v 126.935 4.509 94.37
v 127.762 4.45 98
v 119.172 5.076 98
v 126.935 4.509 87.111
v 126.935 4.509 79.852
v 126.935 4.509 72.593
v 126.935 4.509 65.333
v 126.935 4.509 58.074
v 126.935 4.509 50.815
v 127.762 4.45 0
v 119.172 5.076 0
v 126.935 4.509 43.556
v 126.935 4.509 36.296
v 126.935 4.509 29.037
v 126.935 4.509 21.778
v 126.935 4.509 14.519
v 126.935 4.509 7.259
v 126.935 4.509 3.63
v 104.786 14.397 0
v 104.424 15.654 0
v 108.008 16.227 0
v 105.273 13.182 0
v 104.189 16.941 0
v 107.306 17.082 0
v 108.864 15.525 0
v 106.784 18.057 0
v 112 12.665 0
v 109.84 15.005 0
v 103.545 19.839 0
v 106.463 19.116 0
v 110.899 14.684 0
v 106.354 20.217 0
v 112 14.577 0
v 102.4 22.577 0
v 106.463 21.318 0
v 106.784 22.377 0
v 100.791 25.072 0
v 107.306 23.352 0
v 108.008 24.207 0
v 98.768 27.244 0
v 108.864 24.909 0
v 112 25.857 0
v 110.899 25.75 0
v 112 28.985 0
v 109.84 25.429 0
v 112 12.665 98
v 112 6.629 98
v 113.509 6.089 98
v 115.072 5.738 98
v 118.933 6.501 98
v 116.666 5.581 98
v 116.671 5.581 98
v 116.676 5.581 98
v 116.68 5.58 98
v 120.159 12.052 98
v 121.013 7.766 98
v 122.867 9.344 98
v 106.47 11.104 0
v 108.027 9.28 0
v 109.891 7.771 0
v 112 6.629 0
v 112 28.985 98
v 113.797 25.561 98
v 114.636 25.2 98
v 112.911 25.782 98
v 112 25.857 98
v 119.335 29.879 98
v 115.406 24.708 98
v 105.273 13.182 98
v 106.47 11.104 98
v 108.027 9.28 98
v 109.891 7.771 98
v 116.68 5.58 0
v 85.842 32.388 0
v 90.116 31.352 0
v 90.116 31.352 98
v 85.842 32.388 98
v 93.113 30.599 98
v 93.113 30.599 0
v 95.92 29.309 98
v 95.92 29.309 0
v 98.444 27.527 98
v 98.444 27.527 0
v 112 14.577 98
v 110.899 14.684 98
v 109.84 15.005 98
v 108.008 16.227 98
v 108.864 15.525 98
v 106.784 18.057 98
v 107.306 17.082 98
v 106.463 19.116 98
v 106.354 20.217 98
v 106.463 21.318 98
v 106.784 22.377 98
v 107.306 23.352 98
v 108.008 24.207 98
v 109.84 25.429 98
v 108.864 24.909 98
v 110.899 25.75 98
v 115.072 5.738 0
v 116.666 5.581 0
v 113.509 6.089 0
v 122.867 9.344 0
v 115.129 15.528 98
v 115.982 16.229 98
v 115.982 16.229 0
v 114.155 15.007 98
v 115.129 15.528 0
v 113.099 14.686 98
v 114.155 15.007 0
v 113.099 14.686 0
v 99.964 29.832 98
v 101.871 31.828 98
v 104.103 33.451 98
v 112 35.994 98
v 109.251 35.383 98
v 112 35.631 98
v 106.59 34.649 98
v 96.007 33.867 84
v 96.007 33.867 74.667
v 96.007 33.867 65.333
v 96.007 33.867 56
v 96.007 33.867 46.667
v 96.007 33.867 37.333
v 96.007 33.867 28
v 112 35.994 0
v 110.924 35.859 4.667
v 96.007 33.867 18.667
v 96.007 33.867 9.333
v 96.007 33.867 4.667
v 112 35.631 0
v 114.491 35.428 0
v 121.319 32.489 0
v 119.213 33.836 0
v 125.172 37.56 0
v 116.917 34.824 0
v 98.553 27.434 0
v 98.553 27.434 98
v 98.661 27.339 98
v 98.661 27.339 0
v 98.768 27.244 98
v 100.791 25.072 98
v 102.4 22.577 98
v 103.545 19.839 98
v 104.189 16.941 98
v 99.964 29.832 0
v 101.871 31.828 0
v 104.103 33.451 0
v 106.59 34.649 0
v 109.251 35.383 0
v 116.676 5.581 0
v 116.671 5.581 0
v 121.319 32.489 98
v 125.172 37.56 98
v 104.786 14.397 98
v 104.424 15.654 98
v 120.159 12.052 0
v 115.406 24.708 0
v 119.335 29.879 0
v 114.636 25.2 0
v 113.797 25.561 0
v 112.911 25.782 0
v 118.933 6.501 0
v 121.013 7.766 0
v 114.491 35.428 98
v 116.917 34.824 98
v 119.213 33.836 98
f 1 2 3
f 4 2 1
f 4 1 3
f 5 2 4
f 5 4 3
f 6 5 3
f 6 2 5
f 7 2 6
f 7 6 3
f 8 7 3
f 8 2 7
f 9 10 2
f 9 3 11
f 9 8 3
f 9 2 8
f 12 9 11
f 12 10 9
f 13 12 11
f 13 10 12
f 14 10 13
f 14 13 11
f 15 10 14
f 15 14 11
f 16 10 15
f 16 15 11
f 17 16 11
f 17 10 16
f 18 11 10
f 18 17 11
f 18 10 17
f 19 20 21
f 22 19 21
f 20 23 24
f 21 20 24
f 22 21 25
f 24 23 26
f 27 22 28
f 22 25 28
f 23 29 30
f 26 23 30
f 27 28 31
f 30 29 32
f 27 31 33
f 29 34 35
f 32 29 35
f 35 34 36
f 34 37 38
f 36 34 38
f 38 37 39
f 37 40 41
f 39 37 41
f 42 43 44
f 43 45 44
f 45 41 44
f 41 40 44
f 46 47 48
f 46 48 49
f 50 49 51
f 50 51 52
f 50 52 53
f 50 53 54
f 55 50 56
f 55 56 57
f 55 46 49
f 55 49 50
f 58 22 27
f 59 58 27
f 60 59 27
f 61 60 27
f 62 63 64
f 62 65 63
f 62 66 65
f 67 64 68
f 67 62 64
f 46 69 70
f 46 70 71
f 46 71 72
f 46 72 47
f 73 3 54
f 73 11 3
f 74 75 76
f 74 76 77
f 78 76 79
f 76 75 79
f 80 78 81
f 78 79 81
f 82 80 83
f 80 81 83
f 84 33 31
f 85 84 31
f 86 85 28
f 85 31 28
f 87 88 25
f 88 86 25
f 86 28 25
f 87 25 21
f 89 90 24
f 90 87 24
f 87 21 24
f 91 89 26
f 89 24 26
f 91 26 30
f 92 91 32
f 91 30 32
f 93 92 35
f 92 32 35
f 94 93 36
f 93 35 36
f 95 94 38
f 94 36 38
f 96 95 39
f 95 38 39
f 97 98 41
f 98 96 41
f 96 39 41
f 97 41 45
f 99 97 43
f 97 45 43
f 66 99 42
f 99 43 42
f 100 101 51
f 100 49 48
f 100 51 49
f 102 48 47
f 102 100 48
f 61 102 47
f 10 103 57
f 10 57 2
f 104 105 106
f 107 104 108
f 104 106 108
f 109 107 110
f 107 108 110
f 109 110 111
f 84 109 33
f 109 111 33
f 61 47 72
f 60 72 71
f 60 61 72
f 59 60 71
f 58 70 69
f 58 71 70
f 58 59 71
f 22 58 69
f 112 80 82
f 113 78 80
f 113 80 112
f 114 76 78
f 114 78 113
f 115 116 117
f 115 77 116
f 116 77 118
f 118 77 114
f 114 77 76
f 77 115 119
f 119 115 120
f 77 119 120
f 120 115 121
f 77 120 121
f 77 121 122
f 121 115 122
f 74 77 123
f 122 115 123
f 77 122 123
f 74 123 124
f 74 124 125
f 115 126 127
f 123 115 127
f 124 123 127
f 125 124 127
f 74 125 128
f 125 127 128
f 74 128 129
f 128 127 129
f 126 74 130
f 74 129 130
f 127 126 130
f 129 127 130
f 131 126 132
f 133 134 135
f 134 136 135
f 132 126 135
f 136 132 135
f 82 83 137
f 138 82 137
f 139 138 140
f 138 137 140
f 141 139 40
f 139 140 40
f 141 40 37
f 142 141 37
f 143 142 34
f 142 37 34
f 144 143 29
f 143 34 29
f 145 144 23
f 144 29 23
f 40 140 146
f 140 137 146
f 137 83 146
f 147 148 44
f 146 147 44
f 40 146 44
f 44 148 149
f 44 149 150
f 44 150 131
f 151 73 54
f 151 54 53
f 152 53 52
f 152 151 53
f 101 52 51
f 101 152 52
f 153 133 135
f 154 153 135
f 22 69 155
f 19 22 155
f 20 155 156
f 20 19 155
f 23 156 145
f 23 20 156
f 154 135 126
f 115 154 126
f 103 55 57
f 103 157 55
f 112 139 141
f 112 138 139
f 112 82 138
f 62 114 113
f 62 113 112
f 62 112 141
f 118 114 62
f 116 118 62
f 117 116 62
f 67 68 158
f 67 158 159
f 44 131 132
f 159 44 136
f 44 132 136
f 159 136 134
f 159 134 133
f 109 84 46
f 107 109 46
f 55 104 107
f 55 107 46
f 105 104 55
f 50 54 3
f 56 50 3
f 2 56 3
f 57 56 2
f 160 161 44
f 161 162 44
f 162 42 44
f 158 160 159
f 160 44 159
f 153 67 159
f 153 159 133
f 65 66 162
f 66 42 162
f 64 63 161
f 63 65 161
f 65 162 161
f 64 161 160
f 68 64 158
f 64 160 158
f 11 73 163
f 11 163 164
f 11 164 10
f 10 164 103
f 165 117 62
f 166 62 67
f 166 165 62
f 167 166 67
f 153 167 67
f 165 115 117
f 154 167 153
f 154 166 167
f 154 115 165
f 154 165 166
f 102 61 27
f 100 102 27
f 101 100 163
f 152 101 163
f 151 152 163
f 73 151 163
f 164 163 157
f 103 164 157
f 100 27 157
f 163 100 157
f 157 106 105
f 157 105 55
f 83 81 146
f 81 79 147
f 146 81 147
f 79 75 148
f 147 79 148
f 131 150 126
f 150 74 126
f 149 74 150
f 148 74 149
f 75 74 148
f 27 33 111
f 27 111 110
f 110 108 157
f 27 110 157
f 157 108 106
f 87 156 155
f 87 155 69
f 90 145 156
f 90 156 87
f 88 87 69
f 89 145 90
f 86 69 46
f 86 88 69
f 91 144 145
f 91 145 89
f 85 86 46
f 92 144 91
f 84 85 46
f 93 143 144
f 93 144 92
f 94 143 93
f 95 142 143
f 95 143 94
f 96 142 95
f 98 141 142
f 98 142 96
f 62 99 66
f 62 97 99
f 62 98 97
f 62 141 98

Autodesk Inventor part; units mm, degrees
ref_plane "YZ Plane" through (0, 0, 0) normal (1, 0, 0) x (0, 1, 0)
ref_plane "XZ Plane" through (0, 0, 0) normal (0, 1, 0) x (-1, 0, 0)
ref_plane "XY Plane" through (0, 0, 0) normal (0, 0, 1) x (1, 0, 0)
sketch "Sketch1" plane through (0, 0, 0) normal (0, 0, 1) x (1, 0, 0)
  spline S0 degree 4 poles (254.4361, 38.2581) (252.1599, 38.6503) (246.7887, 39.4993) (237.9849, 40.6183) (225.3575, 41.7043) (211.2027, 42.3417) (196.3926, 42.4701) (181.0313, 42.0702) (165.5064, 41.2217) (149.7852, 40.0448) (134.1096, 38.5775) (118.6247, 36.8508) (103.5, 34.9393) (88.9016, 32.8834) (74.9958, 30.7382) (61.9178, 28.5627) (49.8271, 26.4098) (38.8354, 24.34) (29.0772, 22.4039) (20.6323, 20.6564) (13.6456, 19.1491) (6.9132, 17.6607) (2.9022, 16.74) (0.4691, 16.1882) (0, 16.065) knots 0.214297 0.214297 0.214297 0.214297 0.214297 0.24332 0.281775 0.321542 0.36238 0.404005 0.446178 0.488665 0.531231 0.573688 0.615803 0.657336 0.698047 0.737682 0.775986 0.812688 0.847495 0.880087 0.910093 0.937059 0.960363 1 1 1 1 1
  spline S1 degree 4 poles (300, 15.624) (299.8057, 13.313) (297.7085, 10.3432) (293.0509, 7.5008) (285.3959, 4.883) (278.1124, 3.2165) (269.5147, 1.8925) (259.681, 0.913) (248.7129, 0.2783) (236.7119, -0.0309) (223.8067, -0.0504) (210.1253, 0.1933) (195.7754, 0.645) (180.9677, 1.2494) (165.6517, 1.9825) (150.1916, 2.9048) (134.6873, 3.9451) (119.3375, 5.0495) (104.3042, 6.1987) (89.7566, 7.3561) (75.8492, 8.4887) (62.7429, 9.5824) (50.5811, 10.6226) (39.4971, 11.5797) (29.6294, 12.4513) (21.0712, 13.2264) (13.9639, 13.8721) (7.1036, 14.5126) (2.9683, 14.8997) (0.533, 15.1397) (-0.0042, 15.1841) knots 0 0 0 0 0 0.054372 0.079821 0.107912 0.138499 0.171341 0.206187 0.242784 0.280891 0.320277 0.360713 0.402023 0.443985 0.486373 0.528958 0.57146 0.613642 0.655265 0.696085 0.735853 0.774308 0.811174 0.846157 0.87893 0.909115 0.936252 0.959711 1 1 1 1 1
  arc A0 (0, 16.065) -> (-0.0042, 15.1841) centre (0.1158, 15.624) ccw
  line L0 (0.1158, 15.624) -> (227.9902, 15.624) construction
  line L1 (300, 15.624) -> (0.1158, 15.624) construction
  line L2 (300, 15.624) -> (200, 15.624) construction
  line L3 (200, 15.624) -> (200, 42.3773) construction
  line L4 (200, 15.624) -> (200, 0.5273)
  line L5 (0, 0) -> (0, 20.241)
  line L6 (0, 20.241) -> (238.581, 20.241) construction
  circle A1 centre (238.581, 20.241) radius 14
  line L7 (238.581, 20.241) -> (208.581, 20.241)
  line L8 (238.581, 25.359) -> (238.581, 20.241)
  line L9 (0, 20.241) -> (112, 20.241) construction
  circle A2 centre (112, 20.241) radius 5.39
  line L10 (0, 15.624) -> (112, 15.624) construction
  line L11 (0, 15.624) -> (112, 15.624) construction
  line L12 (112, 15.624) -> (112, 35.9945)
  line L13 (112, 15.624) -> (112, 5.6153)
  spline S2 degree 4 poles (299.2852, 20.241) (299.2279, 20.1316) (299.168, 20.0232) (299.1056, 19.9158) (299.0406, 19.8092) knots 0.014818 0.014818 0.014818 0.014818 0.014818 0.017711 0.017711 0.017711 0.017711 0.017711
  line L14 (299.2071, 20.0822) -> (298.8742, 19.5363) construction
  arc A3 (298.904, 19.5932) -> (299.1702, 20.0296) centre (292.2911, 23.9254) ccw construction
  line L15 (299.432, 20.5214) -> (299.1384, 19.9606) construction
  arc A4 (299.1639, 20.0188) -> (299.3987, 20.4672) centre (292.801, 23.6361) ccw construction
  spline S3 degree 2 poles (295.8506, 16.56) (295.1573, 16.0692) (294.3933, 15.624) knots 0 0 0 1 1 1
  line L16 (294.5507, 15.7157) -> (294.2359, 15.5323) construction
  arc A5 (294.2672, 15.5511) -> (294.519, 15.6978) centre (283.8844, 33.657) ccw construction
  spline S4 degree 4 poles (296.8569, 15.624) (296.6183, 15.8629) (296.3707, 16.0985) (296.1147, 16.3309) (295.8506, 16.56) knots 0.044099 0.044099 0.044099 0.044099 0.044099 0.050856 0.050856 0.050856 0.050856 0.050856
  spline S5 degree 4 poles (219.5872, 34.9119) (218.6954, 34.952) (214.8585, 35.1063) (210.7072, 35.3295) (192.898, 35.4464) (181.4278, 35.0555) (165.1774, 34.1819) (149.5619, 33.1267) (133.8284, 31.3479) (128.2654, 31.0974) (123.3908, 30.59) knots 0 0 0 0 0 0.139244 0.23322 0.363937 0.509983 0.657115 0.798105 1 1 1 1 1
  line L17 (295.9593, 16.4657) -> (295.7419, 16.6543) construction
  arc A6 (295.9374, 16.4843) -> (295.7635, 16.6352) centre (281.8729, 0.4516) ccw construction
  line L18 (232.7438, 34.3645) -> (201.1936, 35.6815) construction
  arc A7 (229.5868, 34.4549) -> (204.3471, 35.5085) centre (136.3483, -1896.3245) ccw construction
  arc A8 (264.2661, 15.123) -> (264.3608, 15.624) centre (238.581, 20.241) ccw
  circle A9 centre (238.581, 20.241) radius 24
  circle A10 centre (112, 20.241) radius 15.39
  spline S6 degree 4 poles (300, 15.624) (300.2691, 17.9337) (298.7834, 21.2677) (294.6934, 24.9798) (287.5317, 28.9406) (280.4869, 31.8205) (271.481, 34.7182) (262.4868, 36.793) (257.7004, 37.6957) (254.4361, 38.2581) knots 0 0 0 0 0 0.247555 0.363857 0.49255 0.632996 0.778264 1 1 1 1 1
  line L19 (285.2945, 32.941) -> (223.5776, 43.5753) construction
  arc A11 (278.7224, 32.6349) -> (229.6682, 41.0872) centre (217.2184, -177.7386) ccw construction
  line L20 (285.2945, 32.941) -> (223.5776, 43.5753) construction
  arc A12 (278.8771, 33.0418) -> (229.6586, 41.5224) centre (200.8949, -272.4733) ccw construction
  spline S7 degree 4 poles (251.493, 31.7362) (243.7009, 32.9676) (232.1602, 34.2966) (216.4428, 35.2879) (196.3923, 35.4611) (181.0317, 35.0615) (165.5053, 34.2127) (149.7883, 33.0365) (134.1012, 31.5672) (118.6474, 29.8462) (103.4397, 27.9193) (89.0589, 25.9037) (74.8371, 23.6927) (62.4884, 21.6695) (49.6399, 19.3545) (46.3795, 18.7429) (43.8125, 18.259) knots 0 0 0 0 0 0.163963 0.232338 0.302031 0.372642 0.443778 0.515047 0.586134 0.656647 0.726187 0.794348 0.86071 0.920346 1 1 1 1 1
  spline S8 degree 4 poles (295.845, 16.556) (295.7198, 16.6646) (294.585, 17.6283) (292.0585, 19.4283) (287.5167, 21.9347) (280.467, 24.8321) (271.9714, 27.5226) (264.2087, 29.4004) (258.4092, 30.5515) (255.0536, 31.1429) (254.4361, 31.2493) (253.9689, 31.3298) (253.5018, 31.4103) (253.0347, 31.4908) (252.5676, 31.5712) knots 0.050892 0.050892 0.050892 0.050892 0.050892 0.054094 0.079507 0.107628 0.138317 0.171335 0.206423 0.214297 0.214297 0.214297 0.214297 0.220253 0.220253 0.220253 0.220253 0.220253
  line L21 (285.2945, 25.9322) -> (223.5776, 36.5664) construction
  line L22 (285.2945, 25.9322) -> (223.5776, 36.5664) construction
  arc A13 (278.7224, 25.626) -> (229.6682, 34.0784) centre (217.2184, -184.7474) ccw construction
  line L23 (270.129, 9.1254) -> (275.129, 9.1254) construction
  line L24 (281.07, 24.4582) -> (286.07, 24.4582) construction
  line L25 (318.8214, -3.3673) -> (272.8686, 36.4793) construction
  arc A14 (303.2079, 0.552) -> (278.9595, 21.5782) centre (281.8576, 0.4252) ccw construction
  spline S9 degree 4 poles (295.8353, 16.5644) (293.4171, 14.8846) (288.4135, 12.6926) (280.7063, 10.6698) (269.511, 8.9398) (259.6826, 7.9632) (248.7122, 7.3273) (236.7121, 7.0186) (223.8065, 6.9989) (210.1254, 7.2427) (195.7753, 7.6944) (180.968, 8.2987) (165.6509, 9.032) (150.1939, 9.954) (134.681, 10.995) (119.3545, 12.0974) (104.259, 13.2519) (89.8748, 14.3954) (75.7524, 15.5471) (62.9065, 16.6165) (50.5107, 17.6776) (46.5166, 18.0246) (43.8125, 18.259) knots 0 0 0 0 0 0.084767 0.124025 0.166179 0.210904 0.257877 0.306788 0.35734 0.409241 0.462263 0.516122 0.570528 0.625186 0.679738 0.73388 0.787304 0.839697 0.89074 0.937143 1 1 1 1 1
  spline S10 degree 4 poles (21.4623, 20.241) (20.6227, 20.317) (20.124, 20.3622) (19.9191, 20.3809) (19.554, 20.414) knots 0.979732 0.979732 0.979732 0.979732 0.979732 1 1 1 1 1 construction
  line L26 (68.4884, 16.1198) -> (19.1367, 20.3983) construction
  arc A15 (63.5515, 16.5281) -> (24.0702, 19.9509) centre (-819.8994, -9944.3712) ccw construction
  line L27 (21.7244, 20.2173) -> (21.2001, 20.2647) construction
  arc A16 (21.2525, 20.26) -> (21.672, 20.222) centre (898.6358, 9712.9556) ccw construction
  line L28 (74.2541, 23.9969) -> (13.371, 12.5211) construction
  arc A17 (68.1759, 22.7939) -> (19.47, 13.6134) centre (1053.3901, -5337.891) ccw construction
  spline S11 degree 4 poles (218.4375, 7.1934) (217.6173, 7.2408) (213.8192, 7.4688) (209.5863, 6.8507) (192.5485, 7.9441) (181.1469, 8.163) (165.7461, 9.0283) (149.1424, 9.8801) (139.9777, 10.7519) (129.1073, 11.2464) (124.6867, 11.5289) knots 0 0 0 0 0 0.127631 0.213723 0.333628 0.467446 0.602621 0.738424 0.880395 0.880395 0.880395 0.880395 0.880395
  line L29 (133.5337, 10.9635) -> (115.8396, 12.0942) construction
  arc A18 (117.618, 12.0789) -> (131.7678, 11.1747) centre (141.027, 267.2384) ccw construction
  line L30 (140.665, 32.3881) -> (106.1166, 28.792) construction
  arc A19 (137.222, 31.4497) -> (109.679, 28.5828) centre (140.6225, -134.9596) ccw construction
  circle A20 centre (238.581, 20.241) radius 18
  line L31 (238.581, 38.241) -> (225.78, 41.559)
  line L32 (238.581, 2.241) -> (224.22, 0)
  line L33 (214.581, 20.241) -> (214.581, 42.1266) construction
  line L34 (127.39, 20.241) -> (127.39, 11.5255) construction
  line L35 (127.39, 20.241) -> (131.3139, 20.241) construction
  line L36 (96.61, 20.241) -> (96.61, 13.8631) construction
  line L37 (270.129, 5.6153) -> (270.129, 15.624) construction
  line L38 (272.129, 7.6153) -> (272.129, 13.624)
  line L39 (268.129, 13.624) -> (268.129, 7.6153)
  arc A21 (268.129, 7.6153) -> (272.129, 7.6153) centre (270.129, 7.6153) ccw
  arc A22 (272.129, 13.624) -> (268.129, 13.624) centre (270.129, 13.624) ccw
  line L40 (270.129, 32.1807) -> (270.129, 22.172) construction
  line L41 (272.129, 30.1807) -> (272.129, 24.172)
  line L42 (268.129, 24.172) -> (268.129, 30.1807)
  arc A23 (272.129, 30.1807) -> (268.129, 30.1807) centre (270.129, 30.1807) ccw
  arc A24 (268.129, 24.172) -> (272.129, 24.172) centre (270.129, 24.172) ccw
  arc A25 (200, 42.3155) -> (199.8539, 42.3773) centre (190.581, 20.241) ccw
  arc A26 (171.273, 34.4958) -> (171.2681, 34.4892) centre (190.581, 20.241) ccw
  arc A27 (210.7484, 7.2304) -> (209.2875, 35.2765) centre (190.581, 20.241) ccw
  arc A28 (169.4455, 8.8703) -> (169.4744, 8.8168) centre (190.581, 20.241) ccw
  arc A29 (153.9768, 9.6824) -> (154.0303, 9.7394) centre (142.78, 20.241) ccw
  arc A30 (151.2419, 33.0959) -> (151.2193, 33.1107) centre (142.78, 20.241) ccw
  arc A31 (132.1299, 31.3508) -> (130.3229, 11.2037) centre (142.78, 20.241) ccw
  arc A32 (95.2741, 13.9693) -> (95.1698, 26.7415) centre (81.22, 20.241) ccw
  arc A33 (66.334, 16.3348) -> (66.5389, 15.624) centre (81.22, 20.241) ccw
  line L43 (112, 20.241) -> (112, 14.851) construction
  line L44 (112, 14.851) -> (91.265, 14.851) construction
  circle A34 centre (91.265, 14.851) radius 4
  circle A35 centre (111.9941, 20.217) radius 5.39
  arc A36 (104.1892, 16.9411) -> (90.1164, 31.3517) centre (87.5379, 14.7568) ccw
  arc A37 (104.1892, 16.9411) -> (116.9519, 5.574) centre (117.1466, 18.6408) ccw
  line L45 (90.1164, 31.3517) -> (85.8424, 32.3881)
  line L46 (119.172, 5.076) -> (116.6664, 5.5813)
  circle A38 centre (238.581, 20.241) radius 13.69
  circle A39 centre (111.9941, 20.217) radius 5.64
  line L47 (111.9941, 20.217) -> (125.1716, 37.5596)
  line L48 (111.9941, 20.217) -> (127.7615, 4.4495)
  line L49 (111.9941, 20.217) -> (119.9703, 20.217) construction
  point P0 (0.783, 16.254)
  point P1 (3.213, 16.812)
  point P2 (7.239, 17.724)
  point P3 (12.813, 18.96)
  point P4 (19.884, 20.484)
  point P5 (28.374, 22.245)
  point P6 (38.199, 24.195)
  point P7 (49.254, 26.28)
  point P8 (61.419, 28.446)
  point P9 (74.571, 30.636)
  point P10 (88.56, 32.793)
  point P11 (103.242, 34.86)
  point P12 (118.455, 36.783)
  point P13 (134.028, 38.511)
  point P14 (149.793, 39.984)
  point P15 (165.576, 41.16)
  point P16 (181.206, 41.985)
  point P17 (196.638, 42.363)
  point P18 (211.554, 42.222)
  point P19 (239.145, 40.389)
  point P20 (262.68, 36.666)
  point P21 (272.577, 34.218)
  point P22 (281.07, 31.467)
  point P23 (288.069, 28.491)
  point P24 (293.505, 25.359)
  point P25 (297.324, 22.137)
  point P26 (300, 15.624)
  point P27 (0.861, 15.105)
  point P28 (3.342, 14.868)
  point P29 (7.446, 14.481)
  point P30 (13.122, 13.953)
  point P31 (20.31, 13.296)
  point P32 (28.92, 12.519)
  point P33 (38.856, 11.64)
  point P34 (50.007, 10.674)
  point P35 (62.244, 9.63)
  point P36 (75.429, 8.529)
  point P37 (89.418, 7.389)
  point P38 (104.052, 6.228)
  point P39 (134.613, 3.966)
  point P40 (150.207, 2.928)
  point P41 (165.783, 2.013)
  point P42 (181.167, 1.263)
  point P43 (196.068, 0.663)
  point P44 (210.468, 0.225)
  point P45 (237.189, 0.039)
  point P46 (249.246, 0.378)
  point P47 (260.262, 1.05)
  point P48 (270.129, 2.076)
  point P49 (278.739, 3.462)
  point P50 (285.993, 5.211)
  point P51 (291.81, 7.314)
  point P52 (296.121, 9.756)
  point P53 (298.863, 12.531)
  point P54 (200, 15.624)
  point P55 (225.3642, 15.624)
  point P56 (238.581, 6.241)
  point P57 (238.581, 34.241)
  point P58 (225.3642, 15.624)
  point P59 (251.7978, 15.624)
  point P60 (0, 16.065)
  point P61 (0, 15.1838)
  point P62 (224.581, 20.241)
  point P63 (112, 25.631)
  point P64 (0, 9.065)
  point P65 (0.783, 9.254)
  point P66 (3.213, 9.812)
  point P67 (7.239, 10.724)
  point P68 (12.813, 11.96)
  point P69 (19.884, 13.484)
  point P70 (28.374, 15.245)
  point P71 (38.199, 17.195)
  point P72 (49.254, 19.28)
  point P73 (61.419, 21.446)
  point P74 (74.571, 23.636)
  point P75 (88.56, 25.793)
  point P76 (103.242, 27.86)
  point P77 (118.455, 29.783)
  point P78 (134.028, 31.511)
  point P79 (149.793, 32.984)
  point P80 (165.576, 34.16)
  point P81 (181.206, 34.985)
  point P82 (225.78, 34.559)
  point P83 (239.145, 33.389)
  point P84 (251.493, 31.745)
  point P85 (262.68, 29.666)
  point P86 (272.577, 27.218)
  point P87 (281.07, 24.467)
  point P88 (288.069, 21.491)
  point P89 (293.505, 18.359)
  point P90 (297.324, 15.137)
  point P91 (299.493, 11.879)
  point P92 (300, 8.624)
  point P93 (-0.0042, 22.1841)
  point P94 (0.861, 22.105)
  point P95 (3.342, 21.868)
  point P96 (7.446, 21.481)
  point P97 (13.122, 20.953)
  point P98 (20.31, 20.296)
  point P99 (28.92, 19.519)
  point P100 (38.856, 18.64)
  point P101 (50.007, 17.674)
  point P102 (62.244, 16.63)
  point P103 (75.429, 15.529)
  point P104 (89.418, 14.389)
  point P105 (104.052, 13.228)
  point P106 (119.172, 12.076)
  point P107 (134.613, 10.966)
  point P108 (150.207, 9.928)
  point P109 (165.783, 9.013)
  point P110 (181.167, 8.263)
  point P111 (196.068, 7.663)
  point P112 (210.468, 7.225)
  point P113 (224.22, 7)
  point P114 (237.189, 7.039)
  point P115 (249.246, 7.378)
  point P116 (260.262, 8.05)
  point P117 (270.129, 9.076)
  point P118 (278.739, 10.462)
  point P119 (285.993, 12.211)
  point P120 (291.81, 14.314)
  point P121 (296.121, 16.756)
  point P122 (298.863, 19.531)
  point P123 (300, 22.624)
  point P124 (18.7405, 20.241)
  point P125 (216.9687, 35.023)
  point P126 (0, 16.065)
  point P127 (296.8569, 15.624)
  point P128 (294.3933, 15.624)
  point P129 (219.5872, 34.9119)
  point P130 (123.3908, 30.59)
  point P131 (254.4361, 38.2581)
  point P132 (0, 9.0562)
  point P133 (0.783, 9.2452)
  point P134 (3.213, 9.8032)
  point P135 (7.239, 10.7152)
  point P136 (12.813, 11.9512)
  point P137 (19.884, 13.4752)
  point P138 (28.374, 15.2362)
  point P139 (38.199, 17.1862)
  point P140 (49.254, 19.2712)
  point P141 (61.419, 21.4372)
  point P142 (74.571, 23.6272)
  point P143 (88.56, 25.7842)
  point P144 (103.242, 27.8512)
  point P145 (118.455, 29.7742)
  point P146 (134.028, 31.5022)
  point P147 (149.793, 32.9752)
  point P148 (165.576, 34.1512)
  point P149 (181.206, 34.9762)
  point P150 (196.638, 35.3542)
  point P151 (211.554, 35.2132)
  point P152 (225.78, 34.5502)
  point P153 (262.68, 29.6572)
  point P154 (272.577, 27.2092)
  point P155 (297.324, 15.1282)
  point P156 (299.493, 11.8702)
  point P157 (300, 8.6152)
  point P158 (254.4361, 31.2493)
  point P159 (216.8848, -206.3625)
  point P160 (278.8769, 26.0734)
  point P161 (229.5906, 33.8662)
  point P162 (-0.0042, 22.2335)
  point P163 (0.861, 22.1544)
  point P164 (3.342, 21.9174)
  point P165 (7.446, 21.5304)
  point P166 (13.122, 21.0024)
  point P167 (28.92, 19.5684)
  point P168 (38.856, 18.6894)
  point P169 (50.007, 17.7234)
  point P170 (62.244, 16.6794)
  point P171 (75.429, 15.5784)
  point P172 (89.418, 14.4384)
  point P173 (104.052, 13.2774)
  point P174 (119.172, 12.1254)
  point P175 (134.613, 11.0154)
  point P176 (150.207, 9.9774)
  point P177 (165.783, 9.0624)
  point P178 (181.167, 8.3124)
  point P179 (196.068, 7.7124)
  point P180 (210.468, 7.2744)
  point P181 (224.22, 7.0494)
  point P182 (237.189, 7.0884)
  point P183 (249.246, 7.4274)
  point P184 (260.262, 8.0994)
  point P185 (278.739, 10.5114)
  point P186 (285.993, 12.2604)
  point P187 (296.121, 16.8054)
  point P188 (298.863, 19.5804)
  point P189 (300, 22.6734)
  point P190 (225.7, -0.0094)
  point P191 (252.2617, 0.522)
  point P192 (227.3495, 41.4508)
  point P193 (105.9778, 6.0782)
  point P194 (115.8008, 5.3277)
  point P195 (98.26, 27.1738)
  point P196 (260.4522, 30.1228)
  point P197 (123.5853, 30.3718)
  point P198 (134.5979, 31.5604)
  point P199 (134.4982, 31.5502)
  dimension "d38" = 10.78
  dimension "d17" = 100
  dimension "d19" = 20.241
  dimension "d20" = 238.581
  dimension "d21" = 28
  dimension "d37" = 112
  dimension "d39" = 112
  dimension "d40" = 0
  dimension "d43" = 10
  dimension "d44" = 10
  dimension "d55" = 4
  dimension "d56" = 90
  dimension "d58" = 4
  dimension "d59" = 20.735
  dimension "d60" = 8
  dimension "d61" = 16.794
  dimension "d62" = 24.4562
  dimension "d63" = 5.4601
  dimension "d64" = 13.0683
  dimension "d65" = 16.5949
  dimension "d66" = 2.5785
  dimension "d68" = 27.38
  dimension "d69" = 11.28
  dimension "d70" = 45
extrude "Extrusion3" add sketch "Sketch1" along normal blind 98 contours L47 A10 L12 S0 | L12 A10 A36 L45 S0 | L47 S7 L12 A10 | L12 S7 A36 A10 | L47 A39 L12 S7 | L12 A39 L13 S9 A37 A36 S7 | A39 L48 S9 L13 | S9 L48 A10 A37 L13 | L13 A37 S9 | L46 A10 L48 S1
properties part number "Flap Foam 89"
